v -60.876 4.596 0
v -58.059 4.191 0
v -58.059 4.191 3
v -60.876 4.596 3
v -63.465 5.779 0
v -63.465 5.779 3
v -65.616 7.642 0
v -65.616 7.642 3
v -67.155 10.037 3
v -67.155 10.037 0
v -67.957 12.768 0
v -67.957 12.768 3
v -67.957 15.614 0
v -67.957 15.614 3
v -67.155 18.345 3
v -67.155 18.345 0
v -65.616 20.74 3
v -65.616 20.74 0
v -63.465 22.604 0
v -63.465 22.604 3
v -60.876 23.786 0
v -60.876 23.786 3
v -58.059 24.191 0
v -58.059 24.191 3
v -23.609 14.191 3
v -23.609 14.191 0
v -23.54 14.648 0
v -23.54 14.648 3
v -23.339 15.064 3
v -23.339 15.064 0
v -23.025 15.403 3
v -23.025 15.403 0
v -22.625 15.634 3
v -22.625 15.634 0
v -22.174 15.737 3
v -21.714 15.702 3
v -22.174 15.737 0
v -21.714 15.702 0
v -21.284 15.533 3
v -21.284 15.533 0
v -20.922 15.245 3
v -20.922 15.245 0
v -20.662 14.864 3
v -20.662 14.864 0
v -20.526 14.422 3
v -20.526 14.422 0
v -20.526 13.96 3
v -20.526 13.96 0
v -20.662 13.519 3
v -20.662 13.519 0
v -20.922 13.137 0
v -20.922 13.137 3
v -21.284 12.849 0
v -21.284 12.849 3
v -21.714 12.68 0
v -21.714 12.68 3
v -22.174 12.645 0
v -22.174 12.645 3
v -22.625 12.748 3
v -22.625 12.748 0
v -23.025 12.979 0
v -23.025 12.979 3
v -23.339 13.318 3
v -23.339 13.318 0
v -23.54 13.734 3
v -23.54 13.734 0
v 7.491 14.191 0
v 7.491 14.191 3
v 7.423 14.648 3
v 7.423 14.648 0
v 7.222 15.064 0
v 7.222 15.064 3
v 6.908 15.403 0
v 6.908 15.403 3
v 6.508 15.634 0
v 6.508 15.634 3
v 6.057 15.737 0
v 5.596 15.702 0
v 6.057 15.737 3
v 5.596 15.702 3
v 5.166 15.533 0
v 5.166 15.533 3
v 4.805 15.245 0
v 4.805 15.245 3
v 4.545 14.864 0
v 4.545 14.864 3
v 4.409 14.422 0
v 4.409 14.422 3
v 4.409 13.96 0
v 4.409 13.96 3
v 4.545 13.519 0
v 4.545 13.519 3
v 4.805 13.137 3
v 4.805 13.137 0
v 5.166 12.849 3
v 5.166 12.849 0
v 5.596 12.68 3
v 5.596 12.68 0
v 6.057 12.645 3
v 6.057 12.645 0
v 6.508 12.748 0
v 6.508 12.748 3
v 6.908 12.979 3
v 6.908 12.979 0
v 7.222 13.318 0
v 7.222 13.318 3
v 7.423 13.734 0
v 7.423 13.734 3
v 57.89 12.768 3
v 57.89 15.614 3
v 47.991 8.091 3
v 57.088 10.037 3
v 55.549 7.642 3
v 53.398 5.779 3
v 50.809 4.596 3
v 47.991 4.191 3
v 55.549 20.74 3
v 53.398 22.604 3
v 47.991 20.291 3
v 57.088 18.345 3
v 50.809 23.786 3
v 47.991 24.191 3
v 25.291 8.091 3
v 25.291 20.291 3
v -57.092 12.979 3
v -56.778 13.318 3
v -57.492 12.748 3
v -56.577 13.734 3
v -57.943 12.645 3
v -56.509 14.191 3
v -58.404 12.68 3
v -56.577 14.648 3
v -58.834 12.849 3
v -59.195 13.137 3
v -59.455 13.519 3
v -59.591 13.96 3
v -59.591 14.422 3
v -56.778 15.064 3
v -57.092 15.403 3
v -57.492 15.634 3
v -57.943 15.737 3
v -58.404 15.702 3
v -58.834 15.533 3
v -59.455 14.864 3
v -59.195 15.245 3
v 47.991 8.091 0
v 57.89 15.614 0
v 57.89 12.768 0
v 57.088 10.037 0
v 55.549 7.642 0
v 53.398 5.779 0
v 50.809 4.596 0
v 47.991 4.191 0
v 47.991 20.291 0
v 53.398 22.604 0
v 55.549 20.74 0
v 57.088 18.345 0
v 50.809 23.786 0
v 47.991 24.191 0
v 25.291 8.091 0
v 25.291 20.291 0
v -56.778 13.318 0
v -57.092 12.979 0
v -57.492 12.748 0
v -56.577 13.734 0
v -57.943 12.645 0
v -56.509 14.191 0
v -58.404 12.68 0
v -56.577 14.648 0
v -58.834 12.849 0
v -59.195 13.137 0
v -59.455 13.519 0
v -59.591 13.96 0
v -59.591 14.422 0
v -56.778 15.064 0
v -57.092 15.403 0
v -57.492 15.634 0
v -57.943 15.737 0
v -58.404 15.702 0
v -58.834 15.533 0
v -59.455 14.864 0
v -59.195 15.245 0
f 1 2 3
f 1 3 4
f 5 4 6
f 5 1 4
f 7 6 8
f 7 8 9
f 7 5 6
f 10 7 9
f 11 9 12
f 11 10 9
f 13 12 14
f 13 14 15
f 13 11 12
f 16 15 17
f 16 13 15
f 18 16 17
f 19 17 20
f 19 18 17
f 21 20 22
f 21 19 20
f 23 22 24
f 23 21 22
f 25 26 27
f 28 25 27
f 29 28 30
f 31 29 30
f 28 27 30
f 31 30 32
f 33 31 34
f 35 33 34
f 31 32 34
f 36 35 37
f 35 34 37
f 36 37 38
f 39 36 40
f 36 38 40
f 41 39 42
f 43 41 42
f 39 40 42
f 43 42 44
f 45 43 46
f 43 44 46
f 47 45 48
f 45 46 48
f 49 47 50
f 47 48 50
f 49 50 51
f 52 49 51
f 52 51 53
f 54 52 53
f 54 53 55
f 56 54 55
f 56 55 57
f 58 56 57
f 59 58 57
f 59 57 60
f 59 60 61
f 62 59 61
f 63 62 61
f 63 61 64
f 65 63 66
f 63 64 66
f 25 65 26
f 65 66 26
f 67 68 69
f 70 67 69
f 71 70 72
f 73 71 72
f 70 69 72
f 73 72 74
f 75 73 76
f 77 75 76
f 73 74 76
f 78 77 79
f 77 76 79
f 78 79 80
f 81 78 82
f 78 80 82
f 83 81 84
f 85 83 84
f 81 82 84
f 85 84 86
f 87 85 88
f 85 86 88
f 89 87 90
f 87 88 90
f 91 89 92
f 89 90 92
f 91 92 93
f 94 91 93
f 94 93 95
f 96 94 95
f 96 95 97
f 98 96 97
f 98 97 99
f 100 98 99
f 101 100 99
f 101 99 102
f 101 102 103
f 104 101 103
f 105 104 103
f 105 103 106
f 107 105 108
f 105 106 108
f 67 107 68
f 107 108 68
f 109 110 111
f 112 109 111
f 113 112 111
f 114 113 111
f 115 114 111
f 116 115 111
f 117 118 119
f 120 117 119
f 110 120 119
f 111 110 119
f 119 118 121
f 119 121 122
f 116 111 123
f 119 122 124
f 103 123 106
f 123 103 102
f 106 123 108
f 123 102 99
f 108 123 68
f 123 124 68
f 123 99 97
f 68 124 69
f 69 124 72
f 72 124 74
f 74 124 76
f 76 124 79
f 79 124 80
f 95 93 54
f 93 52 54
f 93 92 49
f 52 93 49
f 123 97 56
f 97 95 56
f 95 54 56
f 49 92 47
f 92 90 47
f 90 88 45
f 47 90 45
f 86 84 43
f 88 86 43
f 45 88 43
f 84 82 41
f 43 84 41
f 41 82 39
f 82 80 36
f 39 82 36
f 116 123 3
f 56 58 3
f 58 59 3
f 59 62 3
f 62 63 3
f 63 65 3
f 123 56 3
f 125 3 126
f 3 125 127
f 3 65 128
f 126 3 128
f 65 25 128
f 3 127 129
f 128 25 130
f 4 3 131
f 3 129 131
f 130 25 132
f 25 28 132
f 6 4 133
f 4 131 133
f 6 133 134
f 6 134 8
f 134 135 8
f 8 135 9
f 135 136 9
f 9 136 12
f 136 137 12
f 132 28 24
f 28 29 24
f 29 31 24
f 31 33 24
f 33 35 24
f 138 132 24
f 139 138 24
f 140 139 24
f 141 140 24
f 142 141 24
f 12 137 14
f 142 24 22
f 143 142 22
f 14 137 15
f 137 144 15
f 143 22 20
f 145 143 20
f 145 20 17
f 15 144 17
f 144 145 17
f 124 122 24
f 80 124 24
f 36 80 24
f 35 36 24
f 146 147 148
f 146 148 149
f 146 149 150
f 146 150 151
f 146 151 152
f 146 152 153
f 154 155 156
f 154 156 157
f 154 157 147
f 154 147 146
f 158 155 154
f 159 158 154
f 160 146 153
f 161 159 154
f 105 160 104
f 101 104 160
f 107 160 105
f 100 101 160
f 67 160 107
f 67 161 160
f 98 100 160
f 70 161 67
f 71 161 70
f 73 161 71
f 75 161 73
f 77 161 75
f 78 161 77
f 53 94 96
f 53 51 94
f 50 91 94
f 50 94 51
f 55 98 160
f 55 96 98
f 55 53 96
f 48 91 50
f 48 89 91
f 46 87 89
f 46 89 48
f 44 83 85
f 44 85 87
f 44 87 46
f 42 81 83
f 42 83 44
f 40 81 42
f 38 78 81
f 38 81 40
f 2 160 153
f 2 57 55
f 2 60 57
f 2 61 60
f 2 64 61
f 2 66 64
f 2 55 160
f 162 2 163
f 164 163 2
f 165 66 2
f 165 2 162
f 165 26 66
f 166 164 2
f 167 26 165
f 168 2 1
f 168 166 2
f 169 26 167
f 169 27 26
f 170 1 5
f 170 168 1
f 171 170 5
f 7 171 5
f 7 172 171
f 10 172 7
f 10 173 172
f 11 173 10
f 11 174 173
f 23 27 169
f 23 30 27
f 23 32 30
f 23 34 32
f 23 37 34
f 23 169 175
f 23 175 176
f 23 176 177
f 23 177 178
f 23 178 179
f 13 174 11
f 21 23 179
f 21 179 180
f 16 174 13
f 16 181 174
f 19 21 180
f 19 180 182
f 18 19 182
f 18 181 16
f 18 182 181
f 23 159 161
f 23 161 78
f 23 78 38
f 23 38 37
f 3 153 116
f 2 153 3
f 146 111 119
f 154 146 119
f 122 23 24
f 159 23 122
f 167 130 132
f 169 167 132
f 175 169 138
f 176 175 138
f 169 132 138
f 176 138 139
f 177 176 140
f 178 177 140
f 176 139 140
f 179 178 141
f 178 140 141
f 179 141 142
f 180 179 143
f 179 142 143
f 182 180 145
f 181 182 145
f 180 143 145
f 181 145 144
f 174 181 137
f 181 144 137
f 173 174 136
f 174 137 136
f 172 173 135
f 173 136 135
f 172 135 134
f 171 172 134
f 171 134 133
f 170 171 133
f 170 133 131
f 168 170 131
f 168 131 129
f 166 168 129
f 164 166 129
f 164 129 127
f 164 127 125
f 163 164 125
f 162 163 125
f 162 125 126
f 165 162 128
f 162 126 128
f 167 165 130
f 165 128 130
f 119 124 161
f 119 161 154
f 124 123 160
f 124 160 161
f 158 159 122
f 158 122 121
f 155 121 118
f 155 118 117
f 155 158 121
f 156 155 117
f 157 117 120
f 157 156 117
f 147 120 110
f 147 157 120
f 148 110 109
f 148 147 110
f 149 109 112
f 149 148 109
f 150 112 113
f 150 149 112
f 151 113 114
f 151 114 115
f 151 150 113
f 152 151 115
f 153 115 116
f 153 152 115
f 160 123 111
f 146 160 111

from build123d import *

# Parameters (mm, degrees)
BOSS_EXTRUDE1_DEPTH = 3
SKETCH3_R           = 1.55
CUT_EXTRUDE2_DEPTH  = 3
SKETCH4_R           = 1.55
CUT_EXTRUDE4_DEPTH  = 3
SKETCH5_R           = 1.55
CUT_EXTRUDE6_DEPTH  = 3
SKETCH6_W           = 22.7
SKETCH6_H           = 12.2
CUT_EXTRUDE7_DEPTH  = 3


with BuildPart() as part:
    # Sketch1 → Boss-Extrude1 (new body)
    with BuildSketch(Plane.XY):
        with BuildLine():
            Line((-58.058617241, 24.191090517), (47.991382759, 24.191090517))
            ThreePointArc((47.991382759, 24.191090517), (57.991382759, 14.191090517), (47.991382759, 4.191090517))
            Line((47.991382759, 4.191090517), (-58.058617241, 4.191090517))
            ThreePointArc((-58.058617241, 4.191090517), (-68.058617241, 14.191090517), (-58.058617241, 24.191090517))
        make_face()
    extrude(amount=BOSS_EXTRUDE1_DEPTH)

    # Sketch3 → Cut-Extrude2 (cut)
    with BuildSketch(Plane.XY.offset(3)):
        with Locations((-58.058617241, 14.191090517)):
            Circle(SKETCH3_R)
    extrude(amount=-CUT_EXTRUDE2_DEPTH, mode=Mode.SUBTRACT)

    # Sketch4 → Cut-Extrude4 (cut)
    with BuildSketch(Plane(origin=(9.979459273, 1.433252018, 3), x_dir=(1, 0, 0), z_dir=(0, 0, 1))):
        with Locations((-4.038076514, 12.757838499)):
            Circle(SKETCH4_R)
    extrude(amount=-CUT_EXTRUDE4_DEPTH, mode=Mode.SUBTRACT)

    # Sketch5 → Cut-Extrude6 (cut)
    with BuildSketch(Plane(origin=(-9.979459273, 1.433252018, 0), x_dir=(-1, 0, 0), z_dir=(0, 0, -1))):
        with Locations((12.079157968, 12.757838499)):
            Circle(SKETCH5_R)
    extrude(amount=-CUT_EXTRUDE6_DEPTH, mode=Mode.SUBTRACT)

    # Sketch6 → Cut-Extrude7 (cut)
    with BuildSketch(Plane.XY.offset(3)):
        with Locations((36.641382759, 14.191090517)):
            Rectangle(SKETCH6_W, SKETCH6_H)
    extrude(amount=-CUT_EXTRUDE7_DEPTH, mode=Mode.SUBTRACT)


solid = part.part
